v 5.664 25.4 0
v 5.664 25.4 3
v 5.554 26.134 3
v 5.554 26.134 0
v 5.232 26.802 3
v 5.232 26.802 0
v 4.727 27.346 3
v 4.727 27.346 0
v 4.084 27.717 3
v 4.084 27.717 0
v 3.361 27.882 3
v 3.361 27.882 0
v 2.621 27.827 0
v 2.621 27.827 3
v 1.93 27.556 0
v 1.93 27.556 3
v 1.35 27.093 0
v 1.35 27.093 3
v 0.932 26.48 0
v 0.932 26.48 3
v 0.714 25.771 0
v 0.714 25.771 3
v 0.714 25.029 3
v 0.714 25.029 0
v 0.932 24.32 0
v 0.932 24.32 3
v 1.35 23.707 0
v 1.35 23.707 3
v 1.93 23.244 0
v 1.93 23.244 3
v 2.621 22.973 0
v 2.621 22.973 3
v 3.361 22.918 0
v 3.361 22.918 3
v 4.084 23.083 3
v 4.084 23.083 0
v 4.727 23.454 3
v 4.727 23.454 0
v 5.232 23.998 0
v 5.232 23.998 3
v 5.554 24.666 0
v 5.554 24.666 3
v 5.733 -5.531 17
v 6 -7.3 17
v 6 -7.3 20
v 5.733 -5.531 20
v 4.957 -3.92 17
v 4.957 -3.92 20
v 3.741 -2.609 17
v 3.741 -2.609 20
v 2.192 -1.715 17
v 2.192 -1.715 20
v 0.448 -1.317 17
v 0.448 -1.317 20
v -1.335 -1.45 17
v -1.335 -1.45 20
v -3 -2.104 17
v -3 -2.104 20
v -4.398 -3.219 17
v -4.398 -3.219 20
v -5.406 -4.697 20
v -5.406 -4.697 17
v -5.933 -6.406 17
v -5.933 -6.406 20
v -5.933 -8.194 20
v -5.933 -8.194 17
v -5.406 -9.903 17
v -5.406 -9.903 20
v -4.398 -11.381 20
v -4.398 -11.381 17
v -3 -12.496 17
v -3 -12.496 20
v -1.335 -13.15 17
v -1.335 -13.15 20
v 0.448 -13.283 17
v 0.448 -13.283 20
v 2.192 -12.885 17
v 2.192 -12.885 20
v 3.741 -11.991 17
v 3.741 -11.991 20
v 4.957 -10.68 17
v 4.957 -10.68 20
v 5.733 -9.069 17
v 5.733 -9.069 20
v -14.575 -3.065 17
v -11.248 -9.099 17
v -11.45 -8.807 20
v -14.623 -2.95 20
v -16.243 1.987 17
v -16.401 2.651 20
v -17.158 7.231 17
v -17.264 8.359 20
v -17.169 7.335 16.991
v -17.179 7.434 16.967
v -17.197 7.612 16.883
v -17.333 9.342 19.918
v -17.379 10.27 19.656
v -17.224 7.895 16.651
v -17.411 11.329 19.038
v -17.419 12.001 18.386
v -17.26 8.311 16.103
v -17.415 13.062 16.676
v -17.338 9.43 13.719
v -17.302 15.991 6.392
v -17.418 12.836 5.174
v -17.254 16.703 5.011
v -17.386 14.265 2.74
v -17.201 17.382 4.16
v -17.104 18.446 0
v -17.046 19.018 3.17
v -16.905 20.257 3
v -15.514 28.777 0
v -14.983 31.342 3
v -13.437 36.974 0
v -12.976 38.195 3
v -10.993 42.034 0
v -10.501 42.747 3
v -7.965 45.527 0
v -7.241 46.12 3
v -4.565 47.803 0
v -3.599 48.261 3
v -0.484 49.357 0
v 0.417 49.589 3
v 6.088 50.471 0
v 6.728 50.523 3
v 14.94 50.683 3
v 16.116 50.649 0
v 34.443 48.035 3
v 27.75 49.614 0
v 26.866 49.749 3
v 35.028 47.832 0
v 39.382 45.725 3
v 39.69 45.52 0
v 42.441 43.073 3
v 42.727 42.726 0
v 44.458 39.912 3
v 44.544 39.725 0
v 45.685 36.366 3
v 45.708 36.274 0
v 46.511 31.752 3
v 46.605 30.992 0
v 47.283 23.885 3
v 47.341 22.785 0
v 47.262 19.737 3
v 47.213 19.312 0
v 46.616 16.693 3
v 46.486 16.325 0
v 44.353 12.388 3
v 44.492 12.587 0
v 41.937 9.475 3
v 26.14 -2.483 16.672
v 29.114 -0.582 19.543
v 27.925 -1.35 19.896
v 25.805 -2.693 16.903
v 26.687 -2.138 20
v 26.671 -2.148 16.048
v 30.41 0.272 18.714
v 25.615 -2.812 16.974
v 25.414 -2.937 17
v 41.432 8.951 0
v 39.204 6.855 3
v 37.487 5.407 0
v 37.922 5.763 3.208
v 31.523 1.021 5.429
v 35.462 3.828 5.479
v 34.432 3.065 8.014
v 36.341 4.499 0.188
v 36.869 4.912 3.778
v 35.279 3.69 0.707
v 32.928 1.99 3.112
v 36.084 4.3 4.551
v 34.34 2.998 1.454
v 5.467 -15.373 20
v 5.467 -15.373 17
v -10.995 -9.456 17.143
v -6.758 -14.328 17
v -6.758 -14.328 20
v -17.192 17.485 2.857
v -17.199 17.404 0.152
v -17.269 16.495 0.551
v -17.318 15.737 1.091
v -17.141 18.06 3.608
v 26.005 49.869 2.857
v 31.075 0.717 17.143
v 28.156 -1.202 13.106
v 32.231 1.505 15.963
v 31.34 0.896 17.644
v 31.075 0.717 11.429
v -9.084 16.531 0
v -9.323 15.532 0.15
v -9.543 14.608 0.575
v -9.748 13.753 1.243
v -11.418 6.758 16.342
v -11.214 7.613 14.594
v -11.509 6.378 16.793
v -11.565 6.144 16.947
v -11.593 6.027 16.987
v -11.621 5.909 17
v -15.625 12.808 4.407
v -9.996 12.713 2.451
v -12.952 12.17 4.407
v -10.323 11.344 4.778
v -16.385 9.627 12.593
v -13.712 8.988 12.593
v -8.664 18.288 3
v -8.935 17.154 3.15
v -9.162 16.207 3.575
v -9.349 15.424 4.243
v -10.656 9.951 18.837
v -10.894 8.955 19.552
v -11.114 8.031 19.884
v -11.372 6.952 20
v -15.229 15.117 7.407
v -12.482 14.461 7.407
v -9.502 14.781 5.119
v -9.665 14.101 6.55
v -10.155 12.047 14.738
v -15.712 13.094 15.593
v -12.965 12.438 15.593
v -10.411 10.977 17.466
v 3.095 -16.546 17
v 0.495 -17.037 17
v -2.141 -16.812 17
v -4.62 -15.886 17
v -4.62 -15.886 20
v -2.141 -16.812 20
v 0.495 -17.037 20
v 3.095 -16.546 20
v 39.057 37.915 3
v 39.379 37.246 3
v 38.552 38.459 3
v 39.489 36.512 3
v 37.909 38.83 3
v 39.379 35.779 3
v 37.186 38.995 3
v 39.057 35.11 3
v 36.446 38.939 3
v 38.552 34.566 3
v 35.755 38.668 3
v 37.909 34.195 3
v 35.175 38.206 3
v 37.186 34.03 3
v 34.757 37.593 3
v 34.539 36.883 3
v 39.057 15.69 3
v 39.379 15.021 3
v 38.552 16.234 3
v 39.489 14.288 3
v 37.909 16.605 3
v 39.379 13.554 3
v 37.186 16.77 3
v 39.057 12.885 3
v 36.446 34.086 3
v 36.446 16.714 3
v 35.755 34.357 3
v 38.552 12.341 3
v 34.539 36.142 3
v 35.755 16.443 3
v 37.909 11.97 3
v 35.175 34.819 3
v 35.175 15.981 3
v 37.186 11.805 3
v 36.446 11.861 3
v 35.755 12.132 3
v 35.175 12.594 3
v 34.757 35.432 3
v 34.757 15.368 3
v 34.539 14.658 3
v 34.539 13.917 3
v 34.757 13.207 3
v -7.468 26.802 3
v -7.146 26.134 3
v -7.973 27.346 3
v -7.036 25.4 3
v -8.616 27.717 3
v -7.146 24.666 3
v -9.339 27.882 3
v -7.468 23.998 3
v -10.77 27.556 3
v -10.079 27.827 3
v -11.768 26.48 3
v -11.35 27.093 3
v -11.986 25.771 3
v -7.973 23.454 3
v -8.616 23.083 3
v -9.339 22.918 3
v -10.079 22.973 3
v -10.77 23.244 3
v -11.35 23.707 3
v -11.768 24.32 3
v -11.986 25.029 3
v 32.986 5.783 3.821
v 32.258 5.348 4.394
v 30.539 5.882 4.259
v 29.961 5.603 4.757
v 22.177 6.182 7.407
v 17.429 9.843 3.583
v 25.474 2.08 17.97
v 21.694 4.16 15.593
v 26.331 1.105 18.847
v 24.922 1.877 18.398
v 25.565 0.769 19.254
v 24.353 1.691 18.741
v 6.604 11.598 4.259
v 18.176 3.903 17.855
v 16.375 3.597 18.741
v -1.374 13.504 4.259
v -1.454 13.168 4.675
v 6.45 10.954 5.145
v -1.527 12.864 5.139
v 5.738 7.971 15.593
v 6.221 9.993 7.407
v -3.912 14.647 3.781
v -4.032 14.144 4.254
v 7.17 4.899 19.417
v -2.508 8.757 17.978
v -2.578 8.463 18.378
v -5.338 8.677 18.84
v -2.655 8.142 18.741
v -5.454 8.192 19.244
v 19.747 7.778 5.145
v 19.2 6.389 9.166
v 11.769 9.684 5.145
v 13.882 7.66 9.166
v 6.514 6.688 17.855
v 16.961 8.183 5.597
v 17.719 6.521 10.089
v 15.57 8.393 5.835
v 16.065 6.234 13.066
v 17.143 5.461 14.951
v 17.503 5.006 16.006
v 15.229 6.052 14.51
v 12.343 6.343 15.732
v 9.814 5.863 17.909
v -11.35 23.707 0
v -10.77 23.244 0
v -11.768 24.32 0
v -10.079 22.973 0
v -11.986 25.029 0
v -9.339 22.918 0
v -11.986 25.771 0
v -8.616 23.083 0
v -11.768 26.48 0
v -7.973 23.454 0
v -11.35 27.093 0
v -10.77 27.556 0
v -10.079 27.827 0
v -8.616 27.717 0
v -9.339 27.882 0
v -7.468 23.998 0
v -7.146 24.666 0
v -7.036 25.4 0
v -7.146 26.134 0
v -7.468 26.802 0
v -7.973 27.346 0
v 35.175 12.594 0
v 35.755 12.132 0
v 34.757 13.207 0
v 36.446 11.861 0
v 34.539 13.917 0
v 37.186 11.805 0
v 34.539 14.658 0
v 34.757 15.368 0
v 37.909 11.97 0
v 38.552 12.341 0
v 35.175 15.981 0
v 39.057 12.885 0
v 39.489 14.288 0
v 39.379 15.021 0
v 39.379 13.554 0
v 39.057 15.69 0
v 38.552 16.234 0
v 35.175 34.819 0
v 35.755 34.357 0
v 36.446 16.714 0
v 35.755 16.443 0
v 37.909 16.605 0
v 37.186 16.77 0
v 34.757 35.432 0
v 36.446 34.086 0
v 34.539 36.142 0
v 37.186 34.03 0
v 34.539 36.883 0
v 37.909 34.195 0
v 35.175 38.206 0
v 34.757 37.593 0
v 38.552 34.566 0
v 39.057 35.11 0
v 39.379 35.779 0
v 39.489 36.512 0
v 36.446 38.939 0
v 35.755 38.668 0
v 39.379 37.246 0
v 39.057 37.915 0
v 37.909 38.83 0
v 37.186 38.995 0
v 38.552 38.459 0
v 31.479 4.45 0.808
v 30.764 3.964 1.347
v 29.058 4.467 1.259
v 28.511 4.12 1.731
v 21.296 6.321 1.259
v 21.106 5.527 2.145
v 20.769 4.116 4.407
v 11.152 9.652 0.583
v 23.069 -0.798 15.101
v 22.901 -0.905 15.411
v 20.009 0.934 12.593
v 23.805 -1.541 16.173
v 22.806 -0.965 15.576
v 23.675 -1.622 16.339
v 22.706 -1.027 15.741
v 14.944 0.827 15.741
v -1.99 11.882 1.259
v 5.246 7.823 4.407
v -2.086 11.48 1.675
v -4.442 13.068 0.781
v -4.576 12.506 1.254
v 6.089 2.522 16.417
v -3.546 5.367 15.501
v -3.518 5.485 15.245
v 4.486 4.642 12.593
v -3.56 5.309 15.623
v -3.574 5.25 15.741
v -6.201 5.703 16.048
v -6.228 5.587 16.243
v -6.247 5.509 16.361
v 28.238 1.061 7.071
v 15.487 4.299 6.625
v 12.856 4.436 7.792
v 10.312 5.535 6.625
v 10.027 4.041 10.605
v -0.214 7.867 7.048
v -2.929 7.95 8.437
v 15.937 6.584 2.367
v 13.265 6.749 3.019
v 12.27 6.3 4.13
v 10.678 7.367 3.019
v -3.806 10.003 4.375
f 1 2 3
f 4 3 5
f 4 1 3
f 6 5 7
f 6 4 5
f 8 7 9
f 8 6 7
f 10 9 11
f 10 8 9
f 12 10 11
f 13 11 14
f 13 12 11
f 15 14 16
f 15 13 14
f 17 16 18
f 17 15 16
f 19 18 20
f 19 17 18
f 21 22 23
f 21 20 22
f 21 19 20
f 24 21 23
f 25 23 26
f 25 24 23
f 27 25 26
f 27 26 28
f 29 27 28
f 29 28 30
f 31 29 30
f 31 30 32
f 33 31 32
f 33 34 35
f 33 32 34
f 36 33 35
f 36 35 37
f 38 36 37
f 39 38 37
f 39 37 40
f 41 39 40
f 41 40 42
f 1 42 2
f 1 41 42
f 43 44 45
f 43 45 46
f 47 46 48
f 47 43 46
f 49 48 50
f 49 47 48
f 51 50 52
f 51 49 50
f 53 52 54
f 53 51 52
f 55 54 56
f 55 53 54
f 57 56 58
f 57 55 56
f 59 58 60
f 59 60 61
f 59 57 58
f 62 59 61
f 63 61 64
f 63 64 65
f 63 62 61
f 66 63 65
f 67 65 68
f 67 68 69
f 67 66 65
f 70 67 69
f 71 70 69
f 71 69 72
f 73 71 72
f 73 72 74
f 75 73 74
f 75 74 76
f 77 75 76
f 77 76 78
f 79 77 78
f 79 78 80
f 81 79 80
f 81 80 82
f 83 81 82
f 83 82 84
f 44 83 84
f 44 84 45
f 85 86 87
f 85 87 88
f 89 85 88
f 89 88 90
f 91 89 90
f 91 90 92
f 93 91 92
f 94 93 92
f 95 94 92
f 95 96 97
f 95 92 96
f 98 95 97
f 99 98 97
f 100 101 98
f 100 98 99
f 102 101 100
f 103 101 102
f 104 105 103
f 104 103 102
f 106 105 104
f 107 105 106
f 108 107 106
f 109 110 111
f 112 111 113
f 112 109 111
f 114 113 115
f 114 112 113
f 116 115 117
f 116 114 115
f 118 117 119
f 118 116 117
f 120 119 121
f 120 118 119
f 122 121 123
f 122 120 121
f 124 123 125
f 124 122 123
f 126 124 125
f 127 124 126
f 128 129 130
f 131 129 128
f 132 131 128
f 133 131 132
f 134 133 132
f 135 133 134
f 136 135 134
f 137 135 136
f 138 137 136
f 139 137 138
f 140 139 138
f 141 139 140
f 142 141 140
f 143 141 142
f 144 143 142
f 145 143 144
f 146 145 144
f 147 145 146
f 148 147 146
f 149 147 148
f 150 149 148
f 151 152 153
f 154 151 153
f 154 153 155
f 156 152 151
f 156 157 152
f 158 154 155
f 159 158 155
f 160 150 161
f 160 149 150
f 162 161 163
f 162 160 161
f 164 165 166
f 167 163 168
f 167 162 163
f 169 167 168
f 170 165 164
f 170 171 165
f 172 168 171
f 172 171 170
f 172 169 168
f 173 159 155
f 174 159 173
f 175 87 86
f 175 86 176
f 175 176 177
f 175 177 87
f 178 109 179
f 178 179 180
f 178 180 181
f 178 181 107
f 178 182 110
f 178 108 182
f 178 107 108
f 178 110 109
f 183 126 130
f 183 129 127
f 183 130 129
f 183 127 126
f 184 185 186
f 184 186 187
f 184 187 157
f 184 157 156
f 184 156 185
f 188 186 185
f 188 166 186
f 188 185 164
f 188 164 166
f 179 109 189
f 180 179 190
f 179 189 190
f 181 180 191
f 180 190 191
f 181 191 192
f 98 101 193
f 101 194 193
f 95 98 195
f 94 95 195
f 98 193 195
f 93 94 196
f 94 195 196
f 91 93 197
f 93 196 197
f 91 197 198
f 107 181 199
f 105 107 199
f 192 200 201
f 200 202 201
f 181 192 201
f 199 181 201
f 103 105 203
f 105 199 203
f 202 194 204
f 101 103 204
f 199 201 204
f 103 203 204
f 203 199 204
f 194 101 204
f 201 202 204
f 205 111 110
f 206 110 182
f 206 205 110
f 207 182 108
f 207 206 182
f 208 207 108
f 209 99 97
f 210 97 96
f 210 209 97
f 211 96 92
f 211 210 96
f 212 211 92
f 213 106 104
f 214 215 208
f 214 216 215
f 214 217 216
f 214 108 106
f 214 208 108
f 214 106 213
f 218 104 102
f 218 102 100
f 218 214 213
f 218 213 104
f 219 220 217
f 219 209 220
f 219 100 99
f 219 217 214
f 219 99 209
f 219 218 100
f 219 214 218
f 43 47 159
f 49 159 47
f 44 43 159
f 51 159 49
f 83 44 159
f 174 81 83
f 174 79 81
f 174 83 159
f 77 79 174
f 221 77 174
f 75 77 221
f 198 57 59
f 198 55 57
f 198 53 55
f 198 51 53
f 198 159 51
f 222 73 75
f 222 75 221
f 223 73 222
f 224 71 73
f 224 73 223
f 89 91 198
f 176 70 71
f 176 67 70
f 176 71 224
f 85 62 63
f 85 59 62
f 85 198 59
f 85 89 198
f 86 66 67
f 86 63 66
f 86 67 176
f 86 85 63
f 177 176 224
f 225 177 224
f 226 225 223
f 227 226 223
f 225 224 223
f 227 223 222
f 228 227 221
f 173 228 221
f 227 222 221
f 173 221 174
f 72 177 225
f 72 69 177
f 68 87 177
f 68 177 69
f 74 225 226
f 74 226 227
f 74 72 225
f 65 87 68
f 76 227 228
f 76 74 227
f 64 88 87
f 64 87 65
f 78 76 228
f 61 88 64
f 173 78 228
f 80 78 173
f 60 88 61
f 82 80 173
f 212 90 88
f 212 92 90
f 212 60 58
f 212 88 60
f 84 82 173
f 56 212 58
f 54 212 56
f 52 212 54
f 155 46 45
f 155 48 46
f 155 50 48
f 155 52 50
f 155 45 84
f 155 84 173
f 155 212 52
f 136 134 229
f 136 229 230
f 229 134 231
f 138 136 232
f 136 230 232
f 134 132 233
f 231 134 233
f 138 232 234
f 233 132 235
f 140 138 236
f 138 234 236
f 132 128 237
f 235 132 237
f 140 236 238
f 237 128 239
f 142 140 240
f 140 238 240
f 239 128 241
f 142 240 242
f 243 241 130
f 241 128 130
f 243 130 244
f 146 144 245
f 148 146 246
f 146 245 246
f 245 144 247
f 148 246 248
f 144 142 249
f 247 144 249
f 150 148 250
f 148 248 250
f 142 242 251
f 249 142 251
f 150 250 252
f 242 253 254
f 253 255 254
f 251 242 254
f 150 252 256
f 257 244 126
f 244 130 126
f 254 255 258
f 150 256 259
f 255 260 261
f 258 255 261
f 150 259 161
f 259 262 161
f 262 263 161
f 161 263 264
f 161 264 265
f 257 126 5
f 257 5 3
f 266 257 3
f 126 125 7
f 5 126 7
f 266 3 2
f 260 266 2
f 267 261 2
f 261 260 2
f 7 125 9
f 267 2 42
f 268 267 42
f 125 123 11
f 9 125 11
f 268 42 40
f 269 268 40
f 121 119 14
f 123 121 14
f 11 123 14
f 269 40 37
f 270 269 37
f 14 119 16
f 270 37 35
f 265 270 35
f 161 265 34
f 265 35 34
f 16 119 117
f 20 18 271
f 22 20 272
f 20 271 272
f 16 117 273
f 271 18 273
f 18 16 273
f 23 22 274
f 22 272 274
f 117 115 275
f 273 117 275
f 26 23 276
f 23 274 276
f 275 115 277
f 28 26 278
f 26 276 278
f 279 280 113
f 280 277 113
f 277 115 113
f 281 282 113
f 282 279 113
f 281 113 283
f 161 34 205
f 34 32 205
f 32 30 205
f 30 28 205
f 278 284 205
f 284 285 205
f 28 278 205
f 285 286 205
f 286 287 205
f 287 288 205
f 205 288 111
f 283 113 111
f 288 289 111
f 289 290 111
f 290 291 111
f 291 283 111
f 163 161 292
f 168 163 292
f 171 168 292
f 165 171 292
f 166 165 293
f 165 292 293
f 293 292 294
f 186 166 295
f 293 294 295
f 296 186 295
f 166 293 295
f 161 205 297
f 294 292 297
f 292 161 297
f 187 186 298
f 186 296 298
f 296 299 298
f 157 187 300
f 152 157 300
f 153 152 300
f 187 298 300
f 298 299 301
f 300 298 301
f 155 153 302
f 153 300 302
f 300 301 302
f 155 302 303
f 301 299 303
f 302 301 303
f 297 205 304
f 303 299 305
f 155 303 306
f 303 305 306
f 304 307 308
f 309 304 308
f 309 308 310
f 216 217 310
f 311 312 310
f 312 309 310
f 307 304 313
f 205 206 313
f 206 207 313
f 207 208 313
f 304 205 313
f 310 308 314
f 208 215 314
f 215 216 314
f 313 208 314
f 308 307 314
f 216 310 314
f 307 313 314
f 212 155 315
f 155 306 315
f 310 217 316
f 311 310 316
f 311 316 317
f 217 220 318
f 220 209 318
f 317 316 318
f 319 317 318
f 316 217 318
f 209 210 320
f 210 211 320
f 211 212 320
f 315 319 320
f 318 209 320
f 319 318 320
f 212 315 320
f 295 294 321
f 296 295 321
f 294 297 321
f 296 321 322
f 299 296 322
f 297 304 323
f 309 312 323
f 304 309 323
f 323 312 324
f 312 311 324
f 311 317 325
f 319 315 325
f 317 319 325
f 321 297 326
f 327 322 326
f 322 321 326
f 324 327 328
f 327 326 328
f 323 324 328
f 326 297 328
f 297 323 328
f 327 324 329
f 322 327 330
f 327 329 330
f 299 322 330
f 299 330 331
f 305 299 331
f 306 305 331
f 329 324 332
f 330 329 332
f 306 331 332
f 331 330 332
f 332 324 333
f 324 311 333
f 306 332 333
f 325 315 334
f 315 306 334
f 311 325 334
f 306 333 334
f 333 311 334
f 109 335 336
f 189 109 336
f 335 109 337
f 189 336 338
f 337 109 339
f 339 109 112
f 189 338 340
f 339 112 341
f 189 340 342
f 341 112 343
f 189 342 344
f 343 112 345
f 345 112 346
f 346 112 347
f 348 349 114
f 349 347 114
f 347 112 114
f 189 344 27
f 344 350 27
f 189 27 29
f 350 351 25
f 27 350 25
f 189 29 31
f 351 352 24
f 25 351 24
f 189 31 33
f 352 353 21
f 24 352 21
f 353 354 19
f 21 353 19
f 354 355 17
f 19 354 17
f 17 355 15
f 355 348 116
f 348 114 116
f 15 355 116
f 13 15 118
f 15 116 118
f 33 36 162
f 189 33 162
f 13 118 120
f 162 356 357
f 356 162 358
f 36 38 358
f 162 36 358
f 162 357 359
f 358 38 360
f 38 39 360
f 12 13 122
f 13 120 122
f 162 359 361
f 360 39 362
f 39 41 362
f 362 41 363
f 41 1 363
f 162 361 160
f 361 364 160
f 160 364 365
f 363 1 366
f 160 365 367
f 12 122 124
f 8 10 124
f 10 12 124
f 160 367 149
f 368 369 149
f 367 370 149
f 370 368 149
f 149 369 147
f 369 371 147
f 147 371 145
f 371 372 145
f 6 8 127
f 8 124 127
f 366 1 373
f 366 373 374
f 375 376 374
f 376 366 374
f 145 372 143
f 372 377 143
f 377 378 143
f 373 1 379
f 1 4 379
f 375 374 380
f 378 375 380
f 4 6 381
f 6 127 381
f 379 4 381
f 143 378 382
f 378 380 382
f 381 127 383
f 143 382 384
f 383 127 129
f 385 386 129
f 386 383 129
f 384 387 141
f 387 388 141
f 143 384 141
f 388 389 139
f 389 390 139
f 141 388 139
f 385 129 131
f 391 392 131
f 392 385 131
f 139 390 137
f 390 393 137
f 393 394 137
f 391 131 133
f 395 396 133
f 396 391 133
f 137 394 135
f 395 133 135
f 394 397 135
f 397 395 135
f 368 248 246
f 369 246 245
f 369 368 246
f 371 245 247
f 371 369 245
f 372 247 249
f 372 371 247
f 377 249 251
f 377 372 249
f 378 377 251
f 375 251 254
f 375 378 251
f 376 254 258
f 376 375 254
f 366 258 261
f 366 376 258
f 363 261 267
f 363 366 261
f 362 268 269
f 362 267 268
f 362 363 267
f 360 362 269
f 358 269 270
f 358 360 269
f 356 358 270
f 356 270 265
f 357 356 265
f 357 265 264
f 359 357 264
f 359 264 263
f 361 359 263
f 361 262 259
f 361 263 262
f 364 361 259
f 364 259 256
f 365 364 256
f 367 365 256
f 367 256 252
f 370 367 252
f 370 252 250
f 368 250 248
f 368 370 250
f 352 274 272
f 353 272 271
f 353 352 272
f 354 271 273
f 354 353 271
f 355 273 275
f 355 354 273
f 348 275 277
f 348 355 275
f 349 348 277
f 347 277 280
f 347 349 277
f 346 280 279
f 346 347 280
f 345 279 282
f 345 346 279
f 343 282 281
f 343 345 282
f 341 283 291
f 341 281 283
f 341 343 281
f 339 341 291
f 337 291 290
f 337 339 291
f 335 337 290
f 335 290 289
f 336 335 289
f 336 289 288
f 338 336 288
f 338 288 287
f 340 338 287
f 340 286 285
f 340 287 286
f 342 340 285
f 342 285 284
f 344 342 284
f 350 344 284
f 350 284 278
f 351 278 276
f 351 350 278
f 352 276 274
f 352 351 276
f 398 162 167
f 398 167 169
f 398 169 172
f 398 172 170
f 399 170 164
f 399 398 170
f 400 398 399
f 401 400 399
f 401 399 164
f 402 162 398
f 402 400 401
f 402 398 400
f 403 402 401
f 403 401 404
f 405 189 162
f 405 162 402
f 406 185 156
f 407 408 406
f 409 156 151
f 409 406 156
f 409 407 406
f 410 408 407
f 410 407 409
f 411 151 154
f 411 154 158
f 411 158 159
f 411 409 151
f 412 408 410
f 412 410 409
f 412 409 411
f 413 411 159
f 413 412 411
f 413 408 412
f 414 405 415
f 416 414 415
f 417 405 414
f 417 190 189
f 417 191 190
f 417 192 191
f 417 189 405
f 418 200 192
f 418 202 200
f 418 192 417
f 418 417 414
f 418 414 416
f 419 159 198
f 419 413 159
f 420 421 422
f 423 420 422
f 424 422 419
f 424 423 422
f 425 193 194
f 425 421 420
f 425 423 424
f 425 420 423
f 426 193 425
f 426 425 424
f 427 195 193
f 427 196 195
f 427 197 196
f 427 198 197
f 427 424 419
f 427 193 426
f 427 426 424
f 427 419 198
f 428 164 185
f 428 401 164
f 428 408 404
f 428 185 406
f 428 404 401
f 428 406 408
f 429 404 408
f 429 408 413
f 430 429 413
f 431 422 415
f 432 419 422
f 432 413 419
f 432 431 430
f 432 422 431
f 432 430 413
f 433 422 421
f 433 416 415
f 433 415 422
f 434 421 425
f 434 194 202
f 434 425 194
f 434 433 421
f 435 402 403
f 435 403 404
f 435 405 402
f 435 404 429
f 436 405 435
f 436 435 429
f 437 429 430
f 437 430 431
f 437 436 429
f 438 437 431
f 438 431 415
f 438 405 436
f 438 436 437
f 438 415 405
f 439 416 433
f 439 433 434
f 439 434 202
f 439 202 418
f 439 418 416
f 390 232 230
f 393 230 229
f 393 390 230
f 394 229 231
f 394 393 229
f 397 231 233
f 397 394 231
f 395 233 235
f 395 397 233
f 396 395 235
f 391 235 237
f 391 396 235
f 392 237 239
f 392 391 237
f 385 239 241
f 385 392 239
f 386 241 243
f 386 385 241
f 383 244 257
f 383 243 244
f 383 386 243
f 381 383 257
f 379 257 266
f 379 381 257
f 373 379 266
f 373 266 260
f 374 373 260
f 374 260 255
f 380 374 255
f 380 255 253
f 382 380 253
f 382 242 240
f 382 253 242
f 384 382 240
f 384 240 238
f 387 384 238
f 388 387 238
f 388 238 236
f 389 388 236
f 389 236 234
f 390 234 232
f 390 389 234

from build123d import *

# Parameters (mm, degrees)
MAIN_FEATURES_SKETCH_R   = 6
MAIN_FEATURES_SKETCH_R_2 = 2.4892
BOSS_EXTRUDE1_DEPTH      = 20
CUT_EXTRUDE1_DEPTH       = 63.701894918
CUT_EXTRUDE1_DEPTH_BACK  = 17.04931838


with BuildPart() as part:
    # main_features_sketch → Boss-Extrude1 (new body)
    with BuildSketch(Plane.XY):
        with BuildLine():
            ThreePointArc((-6.758273113, -14.327677037), (-0.830819524, -17.014537504), (5.466795464, -15.373205519))
            add(Edge.make_bspline(
                [(-6.758273113, -14.327677037), (-19.815407904, -1.771083652), (-17.868094073, 18.374574848), (-11.559395694, 47.113885006), (0.771302016, 51.653694953), (45.134222968, 49.048434389), (46.011316289, 37.291135993), (48.846230439, 7.873087579), (21.98254038, -4.189519042), (5.466795464, -15.373205519)],
                knots=[0, 0, 0, 0, 0.179468051, 0.221834172, 0.401235983, 0.455769682, 0.712637465, 0.770271344, 1, 1, 1, 1], degree=3))
        make_face()
        with Locations((0, -7.3)):
            Circle(MAIN_FEATURES_SKETCH_R, mode=Mode.SUBTRACT)
        with Locations((3.175, 25.4)):
            Circle(MAIN_FEATURES_SKETCH_R_2, mode=Mode.SUBTRACT)
        with Locations((37, 36.5125)):
            Circle(MAIN_FEATURES_SKETCH_R_2, mode=Mode.SUBTRACT)
        with Locations((37, 14.2875)):
            Circle(MAIN_FEATURES_SKETCH_R_2, mode=Mode.SUBTRACT)
        with Locations((-9.525, 25.4)):
            Circle(MAIN_FEATURES_SKETCH_R_2, mode=Mode.SUBTRACT)
    extrude(amount=BOSS_EXTRUDE1_DEPTH)

    # Sketch2 → Cut-Extrude1 (cut, two sides)
    with BuildSketch(Plane(origin=(-12.676008996, 1.492836838, 0), x_dir=(0, 0, -1), z_dir=(0.972640537, -0.232315271, 0))) as cut_extrude1_sk:
        with BuildLine():
            Line((-3, 56.346373374), (-3, 17.267886161))
            add(Edge.make_bspline(
                [(-3, 17.267886161), (-3, 9.58747876), (-20, 13.827131116), (-20, 5.61289325)],
                knots=[0, 0, 0, 0, 1, 1, 1, 1], degree=3))
            Line((-20, 5.61289325), (-20, 56.346373374))
            Line((-20, 56.346373374), (-3, 56.346373374))
        make_face()
        with BuildLine():
            add(Edge.make_bspline(
                [(0, 15.460949335), (0, 9.016747051), (-17, 7.038917007), (-17, 4.540018839)],
                knots=[0, 0, 0, 0, 1, 1, 1, 1], degree=3))
            Line((-17, 4.540018839), (-17, -15.357439085))
            Line((-17, -15.357439085), (0, -15.357439085))
            Line((0, -15.357439085), (0, 15.460949335))
        make_face()
    extrude(amount=CUT_EXTRUDE1_DEPTH, mode=Mode.SUBTRACT)
    extrude(cut_extrude1_sk.sketch, amount=-CUT_EXTRUDE1_DEPTH_BACK, mode=Mode.SUBTRACT)


solid = part.part
